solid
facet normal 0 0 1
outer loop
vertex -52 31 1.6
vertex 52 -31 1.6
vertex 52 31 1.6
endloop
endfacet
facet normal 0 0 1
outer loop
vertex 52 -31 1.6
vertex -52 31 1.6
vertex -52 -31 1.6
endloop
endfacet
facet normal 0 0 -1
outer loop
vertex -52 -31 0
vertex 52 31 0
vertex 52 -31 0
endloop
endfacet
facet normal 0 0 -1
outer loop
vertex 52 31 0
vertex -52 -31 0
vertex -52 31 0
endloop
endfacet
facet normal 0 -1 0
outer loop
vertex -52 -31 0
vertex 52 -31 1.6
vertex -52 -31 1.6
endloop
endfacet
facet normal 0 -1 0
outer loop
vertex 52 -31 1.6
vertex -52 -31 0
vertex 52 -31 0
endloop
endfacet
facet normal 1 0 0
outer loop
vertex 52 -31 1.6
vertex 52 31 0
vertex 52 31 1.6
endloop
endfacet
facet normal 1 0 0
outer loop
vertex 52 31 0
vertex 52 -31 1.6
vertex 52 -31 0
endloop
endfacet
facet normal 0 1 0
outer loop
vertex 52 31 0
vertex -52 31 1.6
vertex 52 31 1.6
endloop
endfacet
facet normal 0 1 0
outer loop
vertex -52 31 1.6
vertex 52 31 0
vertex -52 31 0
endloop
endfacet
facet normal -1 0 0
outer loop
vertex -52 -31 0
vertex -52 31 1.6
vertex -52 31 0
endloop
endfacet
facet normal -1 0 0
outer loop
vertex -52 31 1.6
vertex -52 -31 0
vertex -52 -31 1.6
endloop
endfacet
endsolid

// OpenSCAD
// Seed OpenSCAD file for task 02; complete it from 01_kicad_mechanical_map.csv.
$fn = 32;
board = [104.000, 62.000, 1.600];
wall = 2.600;
module placeholder_board() {
  translate([-board[0]/2, -board[1]/2, 0]) cube(board);
}
placeholder_board();
